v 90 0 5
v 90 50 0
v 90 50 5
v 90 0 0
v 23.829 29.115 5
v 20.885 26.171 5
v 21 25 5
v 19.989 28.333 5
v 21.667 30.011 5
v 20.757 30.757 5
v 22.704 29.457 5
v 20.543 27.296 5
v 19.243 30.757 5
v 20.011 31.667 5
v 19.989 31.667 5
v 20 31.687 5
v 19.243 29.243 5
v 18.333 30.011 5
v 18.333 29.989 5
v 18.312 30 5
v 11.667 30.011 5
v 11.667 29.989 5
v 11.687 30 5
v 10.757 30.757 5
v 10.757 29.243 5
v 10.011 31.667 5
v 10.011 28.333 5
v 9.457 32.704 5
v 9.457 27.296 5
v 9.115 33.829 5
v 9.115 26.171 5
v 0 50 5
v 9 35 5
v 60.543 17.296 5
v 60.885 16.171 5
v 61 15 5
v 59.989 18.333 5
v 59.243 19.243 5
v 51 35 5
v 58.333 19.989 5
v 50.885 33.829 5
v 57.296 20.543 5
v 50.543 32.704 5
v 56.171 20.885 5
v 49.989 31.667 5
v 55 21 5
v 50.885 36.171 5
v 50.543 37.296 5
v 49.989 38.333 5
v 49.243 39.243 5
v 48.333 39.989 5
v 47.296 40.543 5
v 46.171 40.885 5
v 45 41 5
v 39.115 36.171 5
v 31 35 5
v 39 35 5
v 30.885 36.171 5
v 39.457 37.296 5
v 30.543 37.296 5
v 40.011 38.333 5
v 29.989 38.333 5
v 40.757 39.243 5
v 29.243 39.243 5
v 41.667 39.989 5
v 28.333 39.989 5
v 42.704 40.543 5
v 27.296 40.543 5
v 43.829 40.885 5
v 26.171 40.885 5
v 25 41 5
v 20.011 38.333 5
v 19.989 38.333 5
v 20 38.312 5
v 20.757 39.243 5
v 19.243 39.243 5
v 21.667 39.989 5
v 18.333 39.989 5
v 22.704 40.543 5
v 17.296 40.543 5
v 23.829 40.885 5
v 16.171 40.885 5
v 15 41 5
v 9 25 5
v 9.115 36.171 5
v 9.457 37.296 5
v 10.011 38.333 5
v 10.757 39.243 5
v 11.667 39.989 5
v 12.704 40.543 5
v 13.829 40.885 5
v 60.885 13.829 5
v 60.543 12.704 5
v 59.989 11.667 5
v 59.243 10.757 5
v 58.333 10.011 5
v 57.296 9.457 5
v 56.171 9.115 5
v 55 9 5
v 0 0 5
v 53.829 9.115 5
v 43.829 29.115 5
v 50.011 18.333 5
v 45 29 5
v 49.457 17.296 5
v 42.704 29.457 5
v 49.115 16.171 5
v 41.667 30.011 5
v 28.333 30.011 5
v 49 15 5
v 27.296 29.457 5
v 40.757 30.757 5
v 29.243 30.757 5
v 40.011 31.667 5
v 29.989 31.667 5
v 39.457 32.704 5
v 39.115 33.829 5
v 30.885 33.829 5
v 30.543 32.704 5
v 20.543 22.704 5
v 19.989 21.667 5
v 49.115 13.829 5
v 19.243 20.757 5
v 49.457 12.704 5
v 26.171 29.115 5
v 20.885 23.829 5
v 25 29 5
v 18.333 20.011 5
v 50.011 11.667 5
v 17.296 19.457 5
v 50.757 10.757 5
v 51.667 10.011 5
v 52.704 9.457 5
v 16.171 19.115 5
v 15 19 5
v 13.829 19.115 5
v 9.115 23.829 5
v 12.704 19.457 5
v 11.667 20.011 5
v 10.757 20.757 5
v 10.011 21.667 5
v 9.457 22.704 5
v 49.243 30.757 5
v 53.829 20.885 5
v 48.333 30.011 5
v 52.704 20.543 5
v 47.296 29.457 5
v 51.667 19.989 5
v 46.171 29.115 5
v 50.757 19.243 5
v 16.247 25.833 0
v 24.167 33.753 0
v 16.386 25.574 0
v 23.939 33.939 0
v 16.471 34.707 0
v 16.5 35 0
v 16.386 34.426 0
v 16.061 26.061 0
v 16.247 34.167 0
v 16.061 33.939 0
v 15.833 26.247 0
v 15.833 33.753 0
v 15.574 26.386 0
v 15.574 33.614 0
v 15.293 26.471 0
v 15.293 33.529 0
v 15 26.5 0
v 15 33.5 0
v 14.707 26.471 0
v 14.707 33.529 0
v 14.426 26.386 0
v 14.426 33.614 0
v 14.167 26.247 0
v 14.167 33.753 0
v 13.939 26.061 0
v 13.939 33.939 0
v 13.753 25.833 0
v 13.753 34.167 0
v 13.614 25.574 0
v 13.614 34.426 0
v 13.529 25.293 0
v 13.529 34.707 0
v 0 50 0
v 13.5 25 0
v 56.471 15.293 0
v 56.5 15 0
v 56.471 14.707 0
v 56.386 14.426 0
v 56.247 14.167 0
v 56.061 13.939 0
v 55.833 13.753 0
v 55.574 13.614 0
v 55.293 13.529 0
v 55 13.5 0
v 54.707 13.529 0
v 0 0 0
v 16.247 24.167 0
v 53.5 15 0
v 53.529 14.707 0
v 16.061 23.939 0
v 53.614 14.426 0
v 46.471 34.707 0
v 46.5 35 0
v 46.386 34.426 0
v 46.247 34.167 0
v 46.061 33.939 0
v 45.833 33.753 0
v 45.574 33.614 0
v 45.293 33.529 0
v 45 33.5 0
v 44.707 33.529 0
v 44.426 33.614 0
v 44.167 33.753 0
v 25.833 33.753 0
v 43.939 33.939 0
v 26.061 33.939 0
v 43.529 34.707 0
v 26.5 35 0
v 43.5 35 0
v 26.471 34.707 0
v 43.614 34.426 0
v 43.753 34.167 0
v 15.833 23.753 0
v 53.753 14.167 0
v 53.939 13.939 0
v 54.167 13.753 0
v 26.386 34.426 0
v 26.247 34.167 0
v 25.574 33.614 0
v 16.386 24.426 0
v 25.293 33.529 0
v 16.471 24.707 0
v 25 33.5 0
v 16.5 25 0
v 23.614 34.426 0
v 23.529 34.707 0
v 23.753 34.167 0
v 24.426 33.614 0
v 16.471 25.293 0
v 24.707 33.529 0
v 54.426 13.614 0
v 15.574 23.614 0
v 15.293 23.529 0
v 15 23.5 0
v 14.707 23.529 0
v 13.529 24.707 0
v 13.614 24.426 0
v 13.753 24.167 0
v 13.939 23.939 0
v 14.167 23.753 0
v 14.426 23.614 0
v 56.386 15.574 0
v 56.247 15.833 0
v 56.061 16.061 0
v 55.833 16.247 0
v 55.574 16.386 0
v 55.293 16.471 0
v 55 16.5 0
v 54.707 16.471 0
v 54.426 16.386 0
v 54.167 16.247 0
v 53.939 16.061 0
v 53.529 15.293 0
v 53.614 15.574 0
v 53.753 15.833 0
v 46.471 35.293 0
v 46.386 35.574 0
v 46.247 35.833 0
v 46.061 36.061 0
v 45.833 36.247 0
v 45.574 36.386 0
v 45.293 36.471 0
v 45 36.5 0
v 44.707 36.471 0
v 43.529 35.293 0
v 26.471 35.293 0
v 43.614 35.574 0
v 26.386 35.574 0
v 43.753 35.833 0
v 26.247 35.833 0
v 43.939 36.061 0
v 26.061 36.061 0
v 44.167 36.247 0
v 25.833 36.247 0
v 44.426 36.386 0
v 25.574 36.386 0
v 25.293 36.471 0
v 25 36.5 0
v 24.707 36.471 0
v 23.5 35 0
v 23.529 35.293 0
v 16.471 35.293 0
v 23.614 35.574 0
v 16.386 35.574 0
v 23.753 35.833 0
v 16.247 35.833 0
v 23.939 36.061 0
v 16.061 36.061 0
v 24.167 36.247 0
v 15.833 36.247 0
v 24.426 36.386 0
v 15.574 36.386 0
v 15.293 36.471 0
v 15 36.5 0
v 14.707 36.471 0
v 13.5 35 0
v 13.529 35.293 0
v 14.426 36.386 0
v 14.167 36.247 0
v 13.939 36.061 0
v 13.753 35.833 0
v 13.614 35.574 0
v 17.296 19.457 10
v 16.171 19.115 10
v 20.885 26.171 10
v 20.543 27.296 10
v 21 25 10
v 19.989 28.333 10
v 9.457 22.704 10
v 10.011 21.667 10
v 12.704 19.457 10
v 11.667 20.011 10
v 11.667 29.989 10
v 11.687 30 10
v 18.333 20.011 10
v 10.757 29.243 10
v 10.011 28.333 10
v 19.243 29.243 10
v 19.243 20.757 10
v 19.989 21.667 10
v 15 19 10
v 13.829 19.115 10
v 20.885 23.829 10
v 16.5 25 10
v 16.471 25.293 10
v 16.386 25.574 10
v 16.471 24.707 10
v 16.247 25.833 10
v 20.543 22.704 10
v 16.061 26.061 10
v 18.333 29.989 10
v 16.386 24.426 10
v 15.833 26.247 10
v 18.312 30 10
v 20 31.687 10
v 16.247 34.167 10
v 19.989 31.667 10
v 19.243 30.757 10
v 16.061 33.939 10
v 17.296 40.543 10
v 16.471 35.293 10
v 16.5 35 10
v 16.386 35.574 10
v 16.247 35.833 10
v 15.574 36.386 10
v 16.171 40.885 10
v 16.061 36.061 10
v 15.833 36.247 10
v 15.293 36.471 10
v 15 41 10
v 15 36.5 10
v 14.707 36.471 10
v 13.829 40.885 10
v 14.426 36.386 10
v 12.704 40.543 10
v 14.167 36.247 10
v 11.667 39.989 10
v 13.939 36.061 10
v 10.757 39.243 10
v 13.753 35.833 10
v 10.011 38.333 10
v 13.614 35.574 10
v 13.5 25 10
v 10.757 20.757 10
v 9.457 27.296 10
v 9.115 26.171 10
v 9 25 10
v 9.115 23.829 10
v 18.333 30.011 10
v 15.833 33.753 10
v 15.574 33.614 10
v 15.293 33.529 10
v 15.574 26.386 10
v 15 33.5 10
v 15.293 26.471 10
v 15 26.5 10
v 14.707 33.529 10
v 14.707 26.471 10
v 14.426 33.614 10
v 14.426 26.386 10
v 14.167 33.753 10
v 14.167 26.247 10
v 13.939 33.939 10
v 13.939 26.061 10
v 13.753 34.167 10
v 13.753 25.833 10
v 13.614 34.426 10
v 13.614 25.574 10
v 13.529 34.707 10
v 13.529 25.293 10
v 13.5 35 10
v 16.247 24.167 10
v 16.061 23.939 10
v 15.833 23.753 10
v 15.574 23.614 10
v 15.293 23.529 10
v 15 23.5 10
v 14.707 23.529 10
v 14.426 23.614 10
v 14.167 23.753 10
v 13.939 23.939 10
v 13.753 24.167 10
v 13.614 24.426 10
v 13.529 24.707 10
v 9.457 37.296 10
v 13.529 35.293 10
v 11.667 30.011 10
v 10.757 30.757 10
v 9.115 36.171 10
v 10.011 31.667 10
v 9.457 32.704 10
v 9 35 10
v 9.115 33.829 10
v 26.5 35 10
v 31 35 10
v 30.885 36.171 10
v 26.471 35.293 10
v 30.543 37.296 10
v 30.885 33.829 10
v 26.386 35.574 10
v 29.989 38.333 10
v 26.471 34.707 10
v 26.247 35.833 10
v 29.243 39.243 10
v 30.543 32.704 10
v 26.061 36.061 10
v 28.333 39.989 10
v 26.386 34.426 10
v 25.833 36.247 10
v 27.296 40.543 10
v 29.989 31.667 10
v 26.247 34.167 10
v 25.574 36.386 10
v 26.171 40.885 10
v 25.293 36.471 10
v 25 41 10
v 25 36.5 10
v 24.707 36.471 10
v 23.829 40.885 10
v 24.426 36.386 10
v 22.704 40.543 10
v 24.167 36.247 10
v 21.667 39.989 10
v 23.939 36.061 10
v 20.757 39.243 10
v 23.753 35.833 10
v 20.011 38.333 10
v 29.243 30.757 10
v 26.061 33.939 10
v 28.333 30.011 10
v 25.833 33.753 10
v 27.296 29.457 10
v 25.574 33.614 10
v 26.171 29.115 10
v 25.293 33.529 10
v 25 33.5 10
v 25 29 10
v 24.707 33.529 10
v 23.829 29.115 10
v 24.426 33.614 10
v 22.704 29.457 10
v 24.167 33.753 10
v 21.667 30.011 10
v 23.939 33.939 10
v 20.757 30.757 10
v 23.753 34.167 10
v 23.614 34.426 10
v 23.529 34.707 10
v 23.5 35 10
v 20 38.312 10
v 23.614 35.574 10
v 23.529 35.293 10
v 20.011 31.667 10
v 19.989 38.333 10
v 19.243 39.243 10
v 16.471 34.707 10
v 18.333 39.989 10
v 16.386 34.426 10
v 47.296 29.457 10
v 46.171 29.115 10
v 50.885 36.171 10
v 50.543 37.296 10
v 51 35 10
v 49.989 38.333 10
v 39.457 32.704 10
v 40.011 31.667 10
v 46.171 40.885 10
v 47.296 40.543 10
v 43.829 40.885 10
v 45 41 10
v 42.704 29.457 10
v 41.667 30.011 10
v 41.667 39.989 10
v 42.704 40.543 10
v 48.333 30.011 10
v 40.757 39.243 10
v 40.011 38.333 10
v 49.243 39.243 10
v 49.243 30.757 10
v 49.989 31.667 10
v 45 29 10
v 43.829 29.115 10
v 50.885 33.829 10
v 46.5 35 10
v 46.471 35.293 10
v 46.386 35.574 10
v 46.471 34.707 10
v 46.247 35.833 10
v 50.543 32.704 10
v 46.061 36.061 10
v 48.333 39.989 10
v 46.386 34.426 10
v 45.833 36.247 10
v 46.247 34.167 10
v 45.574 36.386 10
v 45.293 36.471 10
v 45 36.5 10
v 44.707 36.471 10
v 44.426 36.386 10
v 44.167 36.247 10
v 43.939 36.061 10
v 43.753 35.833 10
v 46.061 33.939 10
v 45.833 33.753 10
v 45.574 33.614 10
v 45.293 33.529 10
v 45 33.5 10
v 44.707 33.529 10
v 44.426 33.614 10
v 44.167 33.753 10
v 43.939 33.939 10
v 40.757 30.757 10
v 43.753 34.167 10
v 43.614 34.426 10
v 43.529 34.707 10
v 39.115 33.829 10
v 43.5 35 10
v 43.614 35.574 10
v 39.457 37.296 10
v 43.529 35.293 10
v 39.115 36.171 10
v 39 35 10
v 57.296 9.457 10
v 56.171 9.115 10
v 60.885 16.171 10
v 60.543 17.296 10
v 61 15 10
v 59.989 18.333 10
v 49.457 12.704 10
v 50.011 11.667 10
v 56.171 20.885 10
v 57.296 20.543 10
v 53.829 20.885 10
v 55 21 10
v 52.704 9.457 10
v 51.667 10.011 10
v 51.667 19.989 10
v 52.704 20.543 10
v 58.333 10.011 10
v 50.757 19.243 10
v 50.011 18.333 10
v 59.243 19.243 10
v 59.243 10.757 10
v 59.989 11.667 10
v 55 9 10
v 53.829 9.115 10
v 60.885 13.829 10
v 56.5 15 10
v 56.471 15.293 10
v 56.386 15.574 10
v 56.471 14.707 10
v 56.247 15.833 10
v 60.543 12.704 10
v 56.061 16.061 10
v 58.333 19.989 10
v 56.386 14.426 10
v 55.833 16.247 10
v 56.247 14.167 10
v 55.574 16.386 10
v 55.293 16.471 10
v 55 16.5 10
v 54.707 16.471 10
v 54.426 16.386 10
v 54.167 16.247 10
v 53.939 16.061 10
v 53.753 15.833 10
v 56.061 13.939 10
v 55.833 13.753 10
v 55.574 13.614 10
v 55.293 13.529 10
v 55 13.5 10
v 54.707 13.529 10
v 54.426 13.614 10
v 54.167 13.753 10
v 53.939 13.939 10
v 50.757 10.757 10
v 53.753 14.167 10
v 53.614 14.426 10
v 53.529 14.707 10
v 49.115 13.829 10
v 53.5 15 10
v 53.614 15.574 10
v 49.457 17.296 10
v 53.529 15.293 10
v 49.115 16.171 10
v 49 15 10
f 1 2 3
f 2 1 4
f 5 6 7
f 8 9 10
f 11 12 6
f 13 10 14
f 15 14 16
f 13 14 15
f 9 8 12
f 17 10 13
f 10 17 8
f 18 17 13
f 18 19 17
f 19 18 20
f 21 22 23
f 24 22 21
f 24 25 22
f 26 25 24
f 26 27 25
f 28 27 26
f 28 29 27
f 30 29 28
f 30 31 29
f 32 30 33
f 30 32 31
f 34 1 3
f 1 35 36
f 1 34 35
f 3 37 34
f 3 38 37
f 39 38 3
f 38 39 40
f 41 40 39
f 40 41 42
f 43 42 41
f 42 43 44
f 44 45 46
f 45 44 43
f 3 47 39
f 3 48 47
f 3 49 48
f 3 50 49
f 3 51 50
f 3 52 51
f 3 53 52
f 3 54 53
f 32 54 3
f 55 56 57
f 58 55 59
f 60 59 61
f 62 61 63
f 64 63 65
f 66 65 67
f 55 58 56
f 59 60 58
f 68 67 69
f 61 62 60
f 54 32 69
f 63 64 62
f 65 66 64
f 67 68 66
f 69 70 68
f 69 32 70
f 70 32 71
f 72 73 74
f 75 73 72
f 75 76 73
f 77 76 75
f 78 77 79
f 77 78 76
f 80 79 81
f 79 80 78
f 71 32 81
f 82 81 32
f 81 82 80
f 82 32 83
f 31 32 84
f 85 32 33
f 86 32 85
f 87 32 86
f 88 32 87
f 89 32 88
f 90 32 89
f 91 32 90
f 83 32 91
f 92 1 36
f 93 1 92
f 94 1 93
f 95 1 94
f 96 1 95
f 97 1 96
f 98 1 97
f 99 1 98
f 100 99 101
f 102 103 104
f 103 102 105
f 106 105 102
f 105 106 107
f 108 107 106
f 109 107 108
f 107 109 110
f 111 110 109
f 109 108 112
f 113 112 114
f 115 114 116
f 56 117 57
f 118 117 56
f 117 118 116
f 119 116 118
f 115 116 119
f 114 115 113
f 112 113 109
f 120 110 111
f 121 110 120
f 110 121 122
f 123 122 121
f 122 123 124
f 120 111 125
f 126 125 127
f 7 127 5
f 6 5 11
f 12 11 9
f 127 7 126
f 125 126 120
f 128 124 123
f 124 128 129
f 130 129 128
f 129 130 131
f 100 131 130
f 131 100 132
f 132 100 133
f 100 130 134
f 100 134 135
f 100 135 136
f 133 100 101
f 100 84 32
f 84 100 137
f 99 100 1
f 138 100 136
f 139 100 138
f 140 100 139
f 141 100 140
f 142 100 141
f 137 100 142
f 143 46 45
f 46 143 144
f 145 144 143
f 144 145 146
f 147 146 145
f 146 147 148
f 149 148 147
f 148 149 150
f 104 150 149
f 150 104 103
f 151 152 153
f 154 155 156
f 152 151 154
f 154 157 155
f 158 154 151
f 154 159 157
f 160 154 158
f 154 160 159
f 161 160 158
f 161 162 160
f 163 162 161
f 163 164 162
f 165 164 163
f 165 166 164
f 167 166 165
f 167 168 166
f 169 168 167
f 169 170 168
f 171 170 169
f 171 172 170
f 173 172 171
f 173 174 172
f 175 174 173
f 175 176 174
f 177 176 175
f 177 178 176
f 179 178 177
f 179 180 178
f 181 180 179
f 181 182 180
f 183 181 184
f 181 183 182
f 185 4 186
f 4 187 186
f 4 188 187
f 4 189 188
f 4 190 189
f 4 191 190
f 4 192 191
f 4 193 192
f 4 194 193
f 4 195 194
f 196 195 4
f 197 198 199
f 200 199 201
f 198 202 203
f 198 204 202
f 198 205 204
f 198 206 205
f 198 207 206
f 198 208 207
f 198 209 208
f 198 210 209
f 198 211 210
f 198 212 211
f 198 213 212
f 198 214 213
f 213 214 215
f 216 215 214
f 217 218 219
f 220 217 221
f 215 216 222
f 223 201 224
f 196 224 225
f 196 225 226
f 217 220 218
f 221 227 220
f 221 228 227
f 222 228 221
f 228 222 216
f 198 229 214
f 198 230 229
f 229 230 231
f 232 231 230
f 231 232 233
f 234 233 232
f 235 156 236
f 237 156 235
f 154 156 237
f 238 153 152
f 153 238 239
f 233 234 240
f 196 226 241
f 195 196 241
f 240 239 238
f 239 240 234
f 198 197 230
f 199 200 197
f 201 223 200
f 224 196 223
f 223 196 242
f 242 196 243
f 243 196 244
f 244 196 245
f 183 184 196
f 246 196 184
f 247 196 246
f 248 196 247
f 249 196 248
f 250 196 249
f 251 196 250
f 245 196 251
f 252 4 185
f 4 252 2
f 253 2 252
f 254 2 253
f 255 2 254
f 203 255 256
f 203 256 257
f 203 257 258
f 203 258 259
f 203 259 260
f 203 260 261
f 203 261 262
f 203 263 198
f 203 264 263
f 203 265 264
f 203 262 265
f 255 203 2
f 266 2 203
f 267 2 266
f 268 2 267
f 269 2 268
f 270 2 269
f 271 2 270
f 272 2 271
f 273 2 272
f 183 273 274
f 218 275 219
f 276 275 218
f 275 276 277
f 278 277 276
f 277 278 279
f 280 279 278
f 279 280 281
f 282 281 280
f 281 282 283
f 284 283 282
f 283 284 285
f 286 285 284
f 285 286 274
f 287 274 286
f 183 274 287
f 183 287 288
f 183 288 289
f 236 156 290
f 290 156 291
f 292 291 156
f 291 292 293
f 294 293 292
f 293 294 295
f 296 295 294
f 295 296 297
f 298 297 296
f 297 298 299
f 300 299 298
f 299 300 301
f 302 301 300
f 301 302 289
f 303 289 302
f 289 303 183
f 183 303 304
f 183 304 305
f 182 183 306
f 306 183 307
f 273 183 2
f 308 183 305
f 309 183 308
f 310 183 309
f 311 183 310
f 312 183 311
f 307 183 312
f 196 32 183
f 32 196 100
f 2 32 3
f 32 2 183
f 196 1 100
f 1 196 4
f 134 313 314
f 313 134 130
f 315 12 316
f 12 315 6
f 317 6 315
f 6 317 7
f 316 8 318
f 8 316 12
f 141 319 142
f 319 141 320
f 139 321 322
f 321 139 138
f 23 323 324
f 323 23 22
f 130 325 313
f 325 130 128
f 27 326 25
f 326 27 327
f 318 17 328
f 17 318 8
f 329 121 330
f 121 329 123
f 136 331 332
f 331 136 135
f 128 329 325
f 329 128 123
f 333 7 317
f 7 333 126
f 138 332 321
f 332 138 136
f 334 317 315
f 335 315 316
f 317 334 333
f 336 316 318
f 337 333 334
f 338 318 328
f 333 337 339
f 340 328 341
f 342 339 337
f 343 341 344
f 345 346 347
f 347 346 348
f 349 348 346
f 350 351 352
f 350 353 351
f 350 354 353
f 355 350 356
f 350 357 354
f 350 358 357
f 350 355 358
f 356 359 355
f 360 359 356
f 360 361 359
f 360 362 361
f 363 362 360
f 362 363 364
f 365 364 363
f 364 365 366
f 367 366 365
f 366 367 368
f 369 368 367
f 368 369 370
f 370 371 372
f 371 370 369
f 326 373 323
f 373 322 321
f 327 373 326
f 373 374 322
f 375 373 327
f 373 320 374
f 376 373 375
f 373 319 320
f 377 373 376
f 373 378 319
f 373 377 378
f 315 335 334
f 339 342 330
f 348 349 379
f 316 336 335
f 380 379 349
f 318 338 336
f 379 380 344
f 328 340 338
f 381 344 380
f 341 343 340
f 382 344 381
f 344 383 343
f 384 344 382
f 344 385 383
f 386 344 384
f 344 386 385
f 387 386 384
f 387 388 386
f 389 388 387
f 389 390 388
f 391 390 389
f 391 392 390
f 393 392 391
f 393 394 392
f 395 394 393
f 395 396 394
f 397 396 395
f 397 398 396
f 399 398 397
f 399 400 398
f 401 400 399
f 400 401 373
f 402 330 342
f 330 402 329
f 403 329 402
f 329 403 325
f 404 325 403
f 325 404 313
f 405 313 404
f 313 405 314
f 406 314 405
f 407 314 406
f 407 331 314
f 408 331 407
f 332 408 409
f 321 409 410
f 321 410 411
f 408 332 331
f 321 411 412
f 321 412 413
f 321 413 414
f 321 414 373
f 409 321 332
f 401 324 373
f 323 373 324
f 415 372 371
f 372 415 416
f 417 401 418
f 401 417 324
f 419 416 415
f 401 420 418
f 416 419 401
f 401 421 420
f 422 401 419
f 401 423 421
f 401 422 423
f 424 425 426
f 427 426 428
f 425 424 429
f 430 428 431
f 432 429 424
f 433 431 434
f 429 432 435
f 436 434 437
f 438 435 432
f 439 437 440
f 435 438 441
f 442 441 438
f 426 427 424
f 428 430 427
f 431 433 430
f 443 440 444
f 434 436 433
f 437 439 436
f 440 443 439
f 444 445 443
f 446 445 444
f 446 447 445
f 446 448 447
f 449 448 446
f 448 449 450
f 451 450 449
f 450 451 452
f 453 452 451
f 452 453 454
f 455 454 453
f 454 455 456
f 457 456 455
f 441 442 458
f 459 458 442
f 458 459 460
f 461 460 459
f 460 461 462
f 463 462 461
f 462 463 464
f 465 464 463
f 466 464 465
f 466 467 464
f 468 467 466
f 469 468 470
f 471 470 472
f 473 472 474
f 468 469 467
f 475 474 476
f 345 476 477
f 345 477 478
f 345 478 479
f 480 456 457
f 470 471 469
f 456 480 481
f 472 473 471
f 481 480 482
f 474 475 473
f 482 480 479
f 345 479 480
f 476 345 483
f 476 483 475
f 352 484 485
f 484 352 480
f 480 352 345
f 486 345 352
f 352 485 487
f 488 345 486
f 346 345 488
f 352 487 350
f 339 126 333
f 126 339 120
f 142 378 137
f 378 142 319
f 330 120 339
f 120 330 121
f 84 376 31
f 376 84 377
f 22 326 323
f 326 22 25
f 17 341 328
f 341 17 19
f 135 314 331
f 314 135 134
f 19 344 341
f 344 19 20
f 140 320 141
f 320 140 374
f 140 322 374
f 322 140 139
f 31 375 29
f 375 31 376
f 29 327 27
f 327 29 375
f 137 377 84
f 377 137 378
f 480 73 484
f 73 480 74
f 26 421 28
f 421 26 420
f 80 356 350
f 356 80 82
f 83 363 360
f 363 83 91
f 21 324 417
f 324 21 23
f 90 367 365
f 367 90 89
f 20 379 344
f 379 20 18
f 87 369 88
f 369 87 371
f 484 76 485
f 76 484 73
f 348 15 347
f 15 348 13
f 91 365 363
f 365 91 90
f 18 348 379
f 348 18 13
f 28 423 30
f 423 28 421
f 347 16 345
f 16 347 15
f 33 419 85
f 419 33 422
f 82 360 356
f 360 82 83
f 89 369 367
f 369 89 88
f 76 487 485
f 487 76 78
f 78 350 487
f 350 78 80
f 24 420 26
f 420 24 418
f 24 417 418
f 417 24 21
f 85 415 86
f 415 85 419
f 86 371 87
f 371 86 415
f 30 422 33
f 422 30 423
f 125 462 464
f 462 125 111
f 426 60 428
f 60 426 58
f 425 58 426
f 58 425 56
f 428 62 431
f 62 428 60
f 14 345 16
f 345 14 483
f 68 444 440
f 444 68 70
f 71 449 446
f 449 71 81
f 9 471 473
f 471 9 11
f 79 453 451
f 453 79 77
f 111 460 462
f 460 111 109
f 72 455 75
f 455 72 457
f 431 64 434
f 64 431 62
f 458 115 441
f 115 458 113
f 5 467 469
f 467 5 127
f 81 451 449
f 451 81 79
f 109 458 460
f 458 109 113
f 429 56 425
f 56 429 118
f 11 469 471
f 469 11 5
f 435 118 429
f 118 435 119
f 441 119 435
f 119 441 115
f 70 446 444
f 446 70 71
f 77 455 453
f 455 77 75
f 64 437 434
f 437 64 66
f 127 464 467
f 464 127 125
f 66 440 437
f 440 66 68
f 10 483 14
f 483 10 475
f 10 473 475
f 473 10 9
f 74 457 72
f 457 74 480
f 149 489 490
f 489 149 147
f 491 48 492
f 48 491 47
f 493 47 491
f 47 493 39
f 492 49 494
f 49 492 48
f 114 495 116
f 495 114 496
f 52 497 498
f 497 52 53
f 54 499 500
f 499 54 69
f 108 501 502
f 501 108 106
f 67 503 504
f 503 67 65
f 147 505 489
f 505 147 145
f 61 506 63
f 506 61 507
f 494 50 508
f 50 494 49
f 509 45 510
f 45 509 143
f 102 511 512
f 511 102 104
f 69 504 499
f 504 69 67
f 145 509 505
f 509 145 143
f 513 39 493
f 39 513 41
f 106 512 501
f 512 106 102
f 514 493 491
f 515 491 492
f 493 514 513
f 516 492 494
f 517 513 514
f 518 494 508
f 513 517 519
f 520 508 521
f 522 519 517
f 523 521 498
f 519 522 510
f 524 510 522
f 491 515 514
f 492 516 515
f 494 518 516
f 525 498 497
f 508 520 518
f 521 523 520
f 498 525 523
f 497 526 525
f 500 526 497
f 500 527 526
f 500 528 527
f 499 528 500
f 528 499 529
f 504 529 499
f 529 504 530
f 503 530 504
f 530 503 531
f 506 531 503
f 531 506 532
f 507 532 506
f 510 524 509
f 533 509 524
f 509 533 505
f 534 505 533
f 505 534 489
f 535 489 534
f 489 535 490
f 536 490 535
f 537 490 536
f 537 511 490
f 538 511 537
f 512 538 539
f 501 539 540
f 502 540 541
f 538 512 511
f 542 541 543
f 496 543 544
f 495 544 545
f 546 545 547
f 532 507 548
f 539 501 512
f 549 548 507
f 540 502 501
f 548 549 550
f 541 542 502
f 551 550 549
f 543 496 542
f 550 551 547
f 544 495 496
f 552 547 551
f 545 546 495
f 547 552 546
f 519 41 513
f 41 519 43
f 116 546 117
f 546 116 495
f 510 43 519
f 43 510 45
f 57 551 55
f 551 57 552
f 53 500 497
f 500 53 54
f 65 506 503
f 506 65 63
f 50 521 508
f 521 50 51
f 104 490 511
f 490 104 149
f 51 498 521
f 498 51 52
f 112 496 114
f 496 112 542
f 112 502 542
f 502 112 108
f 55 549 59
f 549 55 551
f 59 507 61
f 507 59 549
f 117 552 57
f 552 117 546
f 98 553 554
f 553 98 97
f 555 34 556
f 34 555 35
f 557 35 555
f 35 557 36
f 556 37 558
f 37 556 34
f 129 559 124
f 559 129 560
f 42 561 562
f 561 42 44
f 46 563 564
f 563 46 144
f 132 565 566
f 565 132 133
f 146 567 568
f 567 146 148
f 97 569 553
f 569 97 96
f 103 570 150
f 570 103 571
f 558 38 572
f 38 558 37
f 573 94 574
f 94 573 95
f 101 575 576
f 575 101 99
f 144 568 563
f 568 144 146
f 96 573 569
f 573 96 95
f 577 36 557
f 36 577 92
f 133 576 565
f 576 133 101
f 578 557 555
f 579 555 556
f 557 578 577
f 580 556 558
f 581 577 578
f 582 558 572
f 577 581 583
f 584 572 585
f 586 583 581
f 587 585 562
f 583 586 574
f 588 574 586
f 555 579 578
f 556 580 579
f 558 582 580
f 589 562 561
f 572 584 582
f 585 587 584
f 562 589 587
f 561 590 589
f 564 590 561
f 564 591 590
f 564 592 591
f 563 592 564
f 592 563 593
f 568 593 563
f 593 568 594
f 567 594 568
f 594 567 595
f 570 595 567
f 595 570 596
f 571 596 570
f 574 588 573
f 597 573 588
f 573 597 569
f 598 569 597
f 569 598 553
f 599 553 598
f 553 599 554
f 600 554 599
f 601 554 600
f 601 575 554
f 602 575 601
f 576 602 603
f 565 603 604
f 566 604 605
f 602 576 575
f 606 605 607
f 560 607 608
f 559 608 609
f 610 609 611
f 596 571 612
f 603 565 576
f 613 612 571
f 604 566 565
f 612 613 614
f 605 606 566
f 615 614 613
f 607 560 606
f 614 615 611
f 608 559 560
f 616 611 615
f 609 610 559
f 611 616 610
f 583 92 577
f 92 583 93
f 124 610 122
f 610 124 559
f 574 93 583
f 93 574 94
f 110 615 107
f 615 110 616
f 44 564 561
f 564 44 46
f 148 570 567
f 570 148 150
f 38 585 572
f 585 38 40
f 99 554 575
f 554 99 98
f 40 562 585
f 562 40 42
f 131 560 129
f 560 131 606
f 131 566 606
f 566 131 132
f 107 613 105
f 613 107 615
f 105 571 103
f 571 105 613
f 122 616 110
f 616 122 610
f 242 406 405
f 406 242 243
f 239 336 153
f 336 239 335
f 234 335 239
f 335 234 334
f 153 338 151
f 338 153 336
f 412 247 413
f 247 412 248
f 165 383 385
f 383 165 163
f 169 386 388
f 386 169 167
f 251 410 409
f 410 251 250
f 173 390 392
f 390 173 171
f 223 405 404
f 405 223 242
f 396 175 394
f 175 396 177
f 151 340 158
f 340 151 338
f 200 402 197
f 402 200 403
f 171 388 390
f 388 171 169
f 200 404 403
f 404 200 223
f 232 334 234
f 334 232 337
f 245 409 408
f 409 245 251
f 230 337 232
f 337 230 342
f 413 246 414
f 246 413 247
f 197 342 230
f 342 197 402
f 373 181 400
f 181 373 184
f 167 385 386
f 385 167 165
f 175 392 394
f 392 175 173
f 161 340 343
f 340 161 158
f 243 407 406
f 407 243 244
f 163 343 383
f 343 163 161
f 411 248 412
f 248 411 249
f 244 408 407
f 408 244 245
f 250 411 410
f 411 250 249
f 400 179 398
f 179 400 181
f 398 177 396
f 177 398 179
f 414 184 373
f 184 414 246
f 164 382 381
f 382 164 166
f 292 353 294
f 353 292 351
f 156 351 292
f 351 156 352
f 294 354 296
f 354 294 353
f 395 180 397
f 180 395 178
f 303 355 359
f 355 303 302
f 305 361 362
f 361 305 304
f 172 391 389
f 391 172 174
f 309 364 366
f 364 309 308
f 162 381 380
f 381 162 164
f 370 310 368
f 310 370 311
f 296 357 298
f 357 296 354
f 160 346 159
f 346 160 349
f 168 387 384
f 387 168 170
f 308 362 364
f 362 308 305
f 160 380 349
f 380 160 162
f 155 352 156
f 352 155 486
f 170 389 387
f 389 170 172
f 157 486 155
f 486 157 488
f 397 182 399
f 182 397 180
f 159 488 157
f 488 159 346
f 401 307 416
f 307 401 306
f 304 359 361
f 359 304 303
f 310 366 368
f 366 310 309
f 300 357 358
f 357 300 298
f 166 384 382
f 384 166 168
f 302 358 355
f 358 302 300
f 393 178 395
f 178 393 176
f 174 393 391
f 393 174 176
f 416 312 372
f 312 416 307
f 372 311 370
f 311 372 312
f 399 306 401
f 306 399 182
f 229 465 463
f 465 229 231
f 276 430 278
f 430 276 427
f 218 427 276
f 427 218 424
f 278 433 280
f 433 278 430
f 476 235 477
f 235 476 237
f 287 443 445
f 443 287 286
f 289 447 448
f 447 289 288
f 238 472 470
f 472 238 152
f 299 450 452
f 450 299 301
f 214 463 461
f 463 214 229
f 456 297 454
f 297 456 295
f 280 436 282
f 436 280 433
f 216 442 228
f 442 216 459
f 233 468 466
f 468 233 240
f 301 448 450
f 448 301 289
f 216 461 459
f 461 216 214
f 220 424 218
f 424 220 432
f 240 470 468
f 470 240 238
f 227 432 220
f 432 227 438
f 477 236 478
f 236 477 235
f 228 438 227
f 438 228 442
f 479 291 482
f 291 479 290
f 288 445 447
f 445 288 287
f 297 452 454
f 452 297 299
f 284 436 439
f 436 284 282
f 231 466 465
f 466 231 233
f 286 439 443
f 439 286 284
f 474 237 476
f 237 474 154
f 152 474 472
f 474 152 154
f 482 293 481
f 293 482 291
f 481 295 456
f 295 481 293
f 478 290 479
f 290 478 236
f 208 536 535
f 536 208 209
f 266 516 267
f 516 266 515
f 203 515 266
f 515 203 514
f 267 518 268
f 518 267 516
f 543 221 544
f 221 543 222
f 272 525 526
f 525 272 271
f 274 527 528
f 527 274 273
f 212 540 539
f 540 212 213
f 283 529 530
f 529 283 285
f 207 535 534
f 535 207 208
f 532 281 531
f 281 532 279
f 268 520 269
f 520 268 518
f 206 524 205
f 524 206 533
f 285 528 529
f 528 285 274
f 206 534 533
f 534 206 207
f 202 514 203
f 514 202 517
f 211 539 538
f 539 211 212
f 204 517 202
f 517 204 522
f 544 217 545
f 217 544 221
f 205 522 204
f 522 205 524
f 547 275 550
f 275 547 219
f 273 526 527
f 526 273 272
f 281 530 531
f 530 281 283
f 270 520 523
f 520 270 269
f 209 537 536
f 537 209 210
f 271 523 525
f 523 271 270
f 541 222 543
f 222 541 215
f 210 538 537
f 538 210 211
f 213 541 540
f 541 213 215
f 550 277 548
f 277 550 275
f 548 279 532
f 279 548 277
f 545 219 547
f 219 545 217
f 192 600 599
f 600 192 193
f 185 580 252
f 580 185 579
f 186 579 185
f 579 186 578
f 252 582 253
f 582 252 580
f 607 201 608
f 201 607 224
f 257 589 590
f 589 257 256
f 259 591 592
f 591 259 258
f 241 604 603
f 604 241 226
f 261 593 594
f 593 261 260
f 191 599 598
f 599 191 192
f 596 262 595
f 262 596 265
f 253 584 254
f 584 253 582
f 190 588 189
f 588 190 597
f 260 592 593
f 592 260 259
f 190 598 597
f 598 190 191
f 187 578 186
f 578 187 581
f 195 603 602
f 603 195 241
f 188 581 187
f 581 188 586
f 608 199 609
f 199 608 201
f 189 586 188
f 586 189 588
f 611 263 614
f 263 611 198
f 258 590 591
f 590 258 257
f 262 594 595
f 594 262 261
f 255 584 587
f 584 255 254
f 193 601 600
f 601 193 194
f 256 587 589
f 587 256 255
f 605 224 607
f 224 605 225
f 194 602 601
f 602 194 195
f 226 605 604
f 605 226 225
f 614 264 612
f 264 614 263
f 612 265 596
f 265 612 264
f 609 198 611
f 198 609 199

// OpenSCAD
$fn = 32;

// ----------------------------------------------------------------------
// Boss field: plate with bosses at given coordinates
// ----------------------------------------------------------------------

// --- parameters (mm) ---
plate_l = 90;             // plate length, X
plate_w = 50;             // plate width, Y
plate_t = 5;              // plate thickness, Z
boss_d = 12;              // boss diameter
boss_h = 5;               // boss height above the plate
bore_d = 3;               // boss bore
fit_tol = 0.1;            // tolerance for press fits, mm
free_tol = 0.3;           // tolerance for clearance fits, mm

total_h = plate_t + boss_h;  // overall height

difference() {
  union() {
    cube([plate_l, plate_w, plate_t]);
    translate([15, 25, plate_t]) cylinder(h = boss_h, d = boss_d);
    translate([15, 35, plate_t]) cylinder(h = boss_h, d = boss_d);
    translate([25, 35, plate_t]) cylinder(h = boss_h, d = boss_d);
    translate([45, 35, plate_t]) cylinder(h = boss_h, d = boss_d);
    translate([55, 15, plate_t]) cylinder(h = boss_h, d = boss_d);
  }
  translate([15, 25, -1]) cylinder(h = total_h + 2, d = bore_d);
  translate([15, 35, -1]) cylinder(h = total_h + 2, d = bore_d);
  translate([25, 35, -1]) cylinder(h = total_h + 2, d = bore_d);
  translate([45, 35, -1]) cylinder(h = total_h + 2, d = bore_d);
  translate([55, 15, -1]) cylinder(h = total_h + 2, d = bore_d);
}
